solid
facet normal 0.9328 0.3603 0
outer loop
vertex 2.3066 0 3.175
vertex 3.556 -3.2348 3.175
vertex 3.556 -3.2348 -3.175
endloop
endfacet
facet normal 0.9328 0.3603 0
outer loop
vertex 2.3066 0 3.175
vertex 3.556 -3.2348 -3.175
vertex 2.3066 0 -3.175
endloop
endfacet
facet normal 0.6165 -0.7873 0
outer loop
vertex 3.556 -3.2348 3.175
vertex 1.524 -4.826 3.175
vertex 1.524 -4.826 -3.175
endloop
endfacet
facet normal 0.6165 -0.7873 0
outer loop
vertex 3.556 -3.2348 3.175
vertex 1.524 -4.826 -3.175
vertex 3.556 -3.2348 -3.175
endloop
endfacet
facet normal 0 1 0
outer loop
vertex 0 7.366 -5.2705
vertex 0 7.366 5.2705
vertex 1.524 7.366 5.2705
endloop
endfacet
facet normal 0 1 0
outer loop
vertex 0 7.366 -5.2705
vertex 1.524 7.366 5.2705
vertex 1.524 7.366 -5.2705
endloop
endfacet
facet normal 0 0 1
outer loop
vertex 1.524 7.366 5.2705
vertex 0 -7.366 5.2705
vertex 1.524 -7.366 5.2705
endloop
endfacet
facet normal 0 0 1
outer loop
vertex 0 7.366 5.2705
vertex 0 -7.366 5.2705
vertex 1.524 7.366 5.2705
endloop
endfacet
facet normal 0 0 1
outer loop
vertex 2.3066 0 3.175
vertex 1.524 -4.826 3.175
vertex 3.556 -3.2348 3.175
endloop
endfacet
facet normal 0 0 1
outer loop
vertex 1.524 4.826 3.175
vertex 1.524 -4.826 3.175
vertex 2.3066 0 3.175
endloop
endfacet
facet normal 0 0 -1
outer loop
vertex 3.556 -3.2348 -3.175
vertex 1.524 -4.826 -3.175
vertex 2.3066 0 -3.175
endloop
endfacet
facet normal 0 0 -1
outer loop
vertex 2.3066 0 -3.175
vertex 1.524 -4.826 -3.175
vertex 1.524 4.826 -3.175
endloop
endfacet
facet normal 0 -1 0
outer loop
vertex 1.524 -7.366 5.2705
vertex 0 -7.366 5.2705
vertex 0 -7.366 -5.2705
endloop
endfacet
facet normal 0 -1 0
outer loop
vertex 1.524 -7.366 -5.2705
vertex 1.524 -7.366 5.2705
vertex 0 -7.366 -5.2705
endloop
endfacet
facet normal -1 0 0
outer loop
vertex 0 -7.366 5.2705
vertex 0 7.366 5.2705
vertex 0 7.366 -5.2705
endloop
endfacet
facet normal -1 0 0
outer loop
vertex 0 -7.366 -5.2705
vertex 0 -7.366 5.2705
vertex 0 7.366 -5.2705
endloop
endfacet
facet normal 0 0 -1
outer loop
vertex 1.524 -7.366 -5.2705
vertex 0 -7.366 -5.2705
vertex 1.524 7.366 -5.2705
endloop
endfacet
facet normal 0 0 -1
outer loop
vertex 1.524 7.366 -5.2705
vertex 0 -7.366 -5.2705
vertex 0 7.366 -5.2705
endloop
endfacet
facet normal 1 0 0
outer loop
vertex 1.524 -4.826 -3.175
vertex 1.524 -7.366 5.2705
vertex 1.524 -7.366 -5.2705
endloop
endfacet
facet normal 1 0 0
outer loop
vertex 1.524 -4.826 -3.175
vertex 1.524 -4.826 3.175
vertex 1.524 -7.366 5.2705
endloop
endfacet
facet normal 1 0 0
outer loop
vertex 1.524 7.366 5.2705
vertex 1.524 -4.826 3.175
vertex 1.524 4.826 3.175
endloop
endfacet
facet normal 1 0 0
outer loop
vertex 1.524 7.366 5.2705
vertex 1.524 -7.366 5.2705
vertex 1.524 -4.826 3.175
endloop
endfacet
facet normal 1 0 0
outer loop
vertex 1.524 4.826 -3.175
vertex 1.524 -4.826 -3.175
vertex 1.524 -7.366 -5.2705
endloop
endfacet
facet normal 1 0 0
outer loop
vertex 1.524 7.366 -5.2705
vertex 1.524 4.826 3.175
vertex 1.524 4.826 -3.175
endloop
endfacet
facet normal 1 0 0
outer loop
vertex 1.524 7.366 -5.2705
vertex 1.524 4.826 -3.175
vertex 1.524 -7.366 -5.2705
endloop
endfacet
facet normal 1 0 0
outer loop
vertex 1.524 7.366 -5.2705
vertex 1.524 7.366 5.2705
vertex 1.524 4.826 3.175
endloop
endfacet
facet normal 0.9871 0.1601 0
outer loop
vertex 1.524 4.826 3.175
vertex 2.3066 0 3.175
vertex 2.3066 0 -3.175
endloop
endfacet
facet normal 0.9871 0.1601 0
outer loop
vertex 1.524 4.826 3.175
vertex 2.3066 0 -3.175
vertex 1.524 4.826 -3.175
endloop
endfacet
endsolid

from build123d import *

# Parameters (mm, degrees)
SKETCH1_W           = 10.541
SKETCH1_H           = 14.732
BOSS_EXTRUDE1_DEPTH = 1.524
SKETCH2_W           = 6.35
SKETCH2_H           = 9.652
BOSS_EXTRUDE2_DEPTH = 2.032
CUT_EXTRUDE1_DEPTH  = 6.35


with BuildPart() as part:
    # Sketch1 → Boss-Extrude1 (new body)
    with BuildSketch(Plane(origin=(0, 0, 0), x_dir=(0, 0, -1), z_dir=(1, 0, 0))):
        Rectangle(SKETCH1_W, SKETCH1_H)
    extrude(amount=BOSS_EXTRUDE1_DEPTH)

    # Sketch2 → Boss-Extrude2 (add)
    with BuildSketch(Plane(origin=(1.524, 0, 0), x_dir=(0, 0, -1), z_dir=(1, 0, 0))):
        Rectangle(SKETCH2_W, SKETCH2_H)
    extrude(amount=BOSS_EXTRUDE2_DEPTH)

    # Sketch3 → Cut-Extrude1 (cut)
    with BuildSketch(Plane.XY.offset(3.175)):
        Polygon((1.524, -4.826), (3.556, -3.234816243), (2.306647012, 0), (1.524, 4.826), (4.824013739, 4.826), (4.824013739, -4.826), align=None)
    extrude(amount=-CUT_EXTRUDE1_DEPTH, mode=Mode.SUBTRACT)


solid = part.part
